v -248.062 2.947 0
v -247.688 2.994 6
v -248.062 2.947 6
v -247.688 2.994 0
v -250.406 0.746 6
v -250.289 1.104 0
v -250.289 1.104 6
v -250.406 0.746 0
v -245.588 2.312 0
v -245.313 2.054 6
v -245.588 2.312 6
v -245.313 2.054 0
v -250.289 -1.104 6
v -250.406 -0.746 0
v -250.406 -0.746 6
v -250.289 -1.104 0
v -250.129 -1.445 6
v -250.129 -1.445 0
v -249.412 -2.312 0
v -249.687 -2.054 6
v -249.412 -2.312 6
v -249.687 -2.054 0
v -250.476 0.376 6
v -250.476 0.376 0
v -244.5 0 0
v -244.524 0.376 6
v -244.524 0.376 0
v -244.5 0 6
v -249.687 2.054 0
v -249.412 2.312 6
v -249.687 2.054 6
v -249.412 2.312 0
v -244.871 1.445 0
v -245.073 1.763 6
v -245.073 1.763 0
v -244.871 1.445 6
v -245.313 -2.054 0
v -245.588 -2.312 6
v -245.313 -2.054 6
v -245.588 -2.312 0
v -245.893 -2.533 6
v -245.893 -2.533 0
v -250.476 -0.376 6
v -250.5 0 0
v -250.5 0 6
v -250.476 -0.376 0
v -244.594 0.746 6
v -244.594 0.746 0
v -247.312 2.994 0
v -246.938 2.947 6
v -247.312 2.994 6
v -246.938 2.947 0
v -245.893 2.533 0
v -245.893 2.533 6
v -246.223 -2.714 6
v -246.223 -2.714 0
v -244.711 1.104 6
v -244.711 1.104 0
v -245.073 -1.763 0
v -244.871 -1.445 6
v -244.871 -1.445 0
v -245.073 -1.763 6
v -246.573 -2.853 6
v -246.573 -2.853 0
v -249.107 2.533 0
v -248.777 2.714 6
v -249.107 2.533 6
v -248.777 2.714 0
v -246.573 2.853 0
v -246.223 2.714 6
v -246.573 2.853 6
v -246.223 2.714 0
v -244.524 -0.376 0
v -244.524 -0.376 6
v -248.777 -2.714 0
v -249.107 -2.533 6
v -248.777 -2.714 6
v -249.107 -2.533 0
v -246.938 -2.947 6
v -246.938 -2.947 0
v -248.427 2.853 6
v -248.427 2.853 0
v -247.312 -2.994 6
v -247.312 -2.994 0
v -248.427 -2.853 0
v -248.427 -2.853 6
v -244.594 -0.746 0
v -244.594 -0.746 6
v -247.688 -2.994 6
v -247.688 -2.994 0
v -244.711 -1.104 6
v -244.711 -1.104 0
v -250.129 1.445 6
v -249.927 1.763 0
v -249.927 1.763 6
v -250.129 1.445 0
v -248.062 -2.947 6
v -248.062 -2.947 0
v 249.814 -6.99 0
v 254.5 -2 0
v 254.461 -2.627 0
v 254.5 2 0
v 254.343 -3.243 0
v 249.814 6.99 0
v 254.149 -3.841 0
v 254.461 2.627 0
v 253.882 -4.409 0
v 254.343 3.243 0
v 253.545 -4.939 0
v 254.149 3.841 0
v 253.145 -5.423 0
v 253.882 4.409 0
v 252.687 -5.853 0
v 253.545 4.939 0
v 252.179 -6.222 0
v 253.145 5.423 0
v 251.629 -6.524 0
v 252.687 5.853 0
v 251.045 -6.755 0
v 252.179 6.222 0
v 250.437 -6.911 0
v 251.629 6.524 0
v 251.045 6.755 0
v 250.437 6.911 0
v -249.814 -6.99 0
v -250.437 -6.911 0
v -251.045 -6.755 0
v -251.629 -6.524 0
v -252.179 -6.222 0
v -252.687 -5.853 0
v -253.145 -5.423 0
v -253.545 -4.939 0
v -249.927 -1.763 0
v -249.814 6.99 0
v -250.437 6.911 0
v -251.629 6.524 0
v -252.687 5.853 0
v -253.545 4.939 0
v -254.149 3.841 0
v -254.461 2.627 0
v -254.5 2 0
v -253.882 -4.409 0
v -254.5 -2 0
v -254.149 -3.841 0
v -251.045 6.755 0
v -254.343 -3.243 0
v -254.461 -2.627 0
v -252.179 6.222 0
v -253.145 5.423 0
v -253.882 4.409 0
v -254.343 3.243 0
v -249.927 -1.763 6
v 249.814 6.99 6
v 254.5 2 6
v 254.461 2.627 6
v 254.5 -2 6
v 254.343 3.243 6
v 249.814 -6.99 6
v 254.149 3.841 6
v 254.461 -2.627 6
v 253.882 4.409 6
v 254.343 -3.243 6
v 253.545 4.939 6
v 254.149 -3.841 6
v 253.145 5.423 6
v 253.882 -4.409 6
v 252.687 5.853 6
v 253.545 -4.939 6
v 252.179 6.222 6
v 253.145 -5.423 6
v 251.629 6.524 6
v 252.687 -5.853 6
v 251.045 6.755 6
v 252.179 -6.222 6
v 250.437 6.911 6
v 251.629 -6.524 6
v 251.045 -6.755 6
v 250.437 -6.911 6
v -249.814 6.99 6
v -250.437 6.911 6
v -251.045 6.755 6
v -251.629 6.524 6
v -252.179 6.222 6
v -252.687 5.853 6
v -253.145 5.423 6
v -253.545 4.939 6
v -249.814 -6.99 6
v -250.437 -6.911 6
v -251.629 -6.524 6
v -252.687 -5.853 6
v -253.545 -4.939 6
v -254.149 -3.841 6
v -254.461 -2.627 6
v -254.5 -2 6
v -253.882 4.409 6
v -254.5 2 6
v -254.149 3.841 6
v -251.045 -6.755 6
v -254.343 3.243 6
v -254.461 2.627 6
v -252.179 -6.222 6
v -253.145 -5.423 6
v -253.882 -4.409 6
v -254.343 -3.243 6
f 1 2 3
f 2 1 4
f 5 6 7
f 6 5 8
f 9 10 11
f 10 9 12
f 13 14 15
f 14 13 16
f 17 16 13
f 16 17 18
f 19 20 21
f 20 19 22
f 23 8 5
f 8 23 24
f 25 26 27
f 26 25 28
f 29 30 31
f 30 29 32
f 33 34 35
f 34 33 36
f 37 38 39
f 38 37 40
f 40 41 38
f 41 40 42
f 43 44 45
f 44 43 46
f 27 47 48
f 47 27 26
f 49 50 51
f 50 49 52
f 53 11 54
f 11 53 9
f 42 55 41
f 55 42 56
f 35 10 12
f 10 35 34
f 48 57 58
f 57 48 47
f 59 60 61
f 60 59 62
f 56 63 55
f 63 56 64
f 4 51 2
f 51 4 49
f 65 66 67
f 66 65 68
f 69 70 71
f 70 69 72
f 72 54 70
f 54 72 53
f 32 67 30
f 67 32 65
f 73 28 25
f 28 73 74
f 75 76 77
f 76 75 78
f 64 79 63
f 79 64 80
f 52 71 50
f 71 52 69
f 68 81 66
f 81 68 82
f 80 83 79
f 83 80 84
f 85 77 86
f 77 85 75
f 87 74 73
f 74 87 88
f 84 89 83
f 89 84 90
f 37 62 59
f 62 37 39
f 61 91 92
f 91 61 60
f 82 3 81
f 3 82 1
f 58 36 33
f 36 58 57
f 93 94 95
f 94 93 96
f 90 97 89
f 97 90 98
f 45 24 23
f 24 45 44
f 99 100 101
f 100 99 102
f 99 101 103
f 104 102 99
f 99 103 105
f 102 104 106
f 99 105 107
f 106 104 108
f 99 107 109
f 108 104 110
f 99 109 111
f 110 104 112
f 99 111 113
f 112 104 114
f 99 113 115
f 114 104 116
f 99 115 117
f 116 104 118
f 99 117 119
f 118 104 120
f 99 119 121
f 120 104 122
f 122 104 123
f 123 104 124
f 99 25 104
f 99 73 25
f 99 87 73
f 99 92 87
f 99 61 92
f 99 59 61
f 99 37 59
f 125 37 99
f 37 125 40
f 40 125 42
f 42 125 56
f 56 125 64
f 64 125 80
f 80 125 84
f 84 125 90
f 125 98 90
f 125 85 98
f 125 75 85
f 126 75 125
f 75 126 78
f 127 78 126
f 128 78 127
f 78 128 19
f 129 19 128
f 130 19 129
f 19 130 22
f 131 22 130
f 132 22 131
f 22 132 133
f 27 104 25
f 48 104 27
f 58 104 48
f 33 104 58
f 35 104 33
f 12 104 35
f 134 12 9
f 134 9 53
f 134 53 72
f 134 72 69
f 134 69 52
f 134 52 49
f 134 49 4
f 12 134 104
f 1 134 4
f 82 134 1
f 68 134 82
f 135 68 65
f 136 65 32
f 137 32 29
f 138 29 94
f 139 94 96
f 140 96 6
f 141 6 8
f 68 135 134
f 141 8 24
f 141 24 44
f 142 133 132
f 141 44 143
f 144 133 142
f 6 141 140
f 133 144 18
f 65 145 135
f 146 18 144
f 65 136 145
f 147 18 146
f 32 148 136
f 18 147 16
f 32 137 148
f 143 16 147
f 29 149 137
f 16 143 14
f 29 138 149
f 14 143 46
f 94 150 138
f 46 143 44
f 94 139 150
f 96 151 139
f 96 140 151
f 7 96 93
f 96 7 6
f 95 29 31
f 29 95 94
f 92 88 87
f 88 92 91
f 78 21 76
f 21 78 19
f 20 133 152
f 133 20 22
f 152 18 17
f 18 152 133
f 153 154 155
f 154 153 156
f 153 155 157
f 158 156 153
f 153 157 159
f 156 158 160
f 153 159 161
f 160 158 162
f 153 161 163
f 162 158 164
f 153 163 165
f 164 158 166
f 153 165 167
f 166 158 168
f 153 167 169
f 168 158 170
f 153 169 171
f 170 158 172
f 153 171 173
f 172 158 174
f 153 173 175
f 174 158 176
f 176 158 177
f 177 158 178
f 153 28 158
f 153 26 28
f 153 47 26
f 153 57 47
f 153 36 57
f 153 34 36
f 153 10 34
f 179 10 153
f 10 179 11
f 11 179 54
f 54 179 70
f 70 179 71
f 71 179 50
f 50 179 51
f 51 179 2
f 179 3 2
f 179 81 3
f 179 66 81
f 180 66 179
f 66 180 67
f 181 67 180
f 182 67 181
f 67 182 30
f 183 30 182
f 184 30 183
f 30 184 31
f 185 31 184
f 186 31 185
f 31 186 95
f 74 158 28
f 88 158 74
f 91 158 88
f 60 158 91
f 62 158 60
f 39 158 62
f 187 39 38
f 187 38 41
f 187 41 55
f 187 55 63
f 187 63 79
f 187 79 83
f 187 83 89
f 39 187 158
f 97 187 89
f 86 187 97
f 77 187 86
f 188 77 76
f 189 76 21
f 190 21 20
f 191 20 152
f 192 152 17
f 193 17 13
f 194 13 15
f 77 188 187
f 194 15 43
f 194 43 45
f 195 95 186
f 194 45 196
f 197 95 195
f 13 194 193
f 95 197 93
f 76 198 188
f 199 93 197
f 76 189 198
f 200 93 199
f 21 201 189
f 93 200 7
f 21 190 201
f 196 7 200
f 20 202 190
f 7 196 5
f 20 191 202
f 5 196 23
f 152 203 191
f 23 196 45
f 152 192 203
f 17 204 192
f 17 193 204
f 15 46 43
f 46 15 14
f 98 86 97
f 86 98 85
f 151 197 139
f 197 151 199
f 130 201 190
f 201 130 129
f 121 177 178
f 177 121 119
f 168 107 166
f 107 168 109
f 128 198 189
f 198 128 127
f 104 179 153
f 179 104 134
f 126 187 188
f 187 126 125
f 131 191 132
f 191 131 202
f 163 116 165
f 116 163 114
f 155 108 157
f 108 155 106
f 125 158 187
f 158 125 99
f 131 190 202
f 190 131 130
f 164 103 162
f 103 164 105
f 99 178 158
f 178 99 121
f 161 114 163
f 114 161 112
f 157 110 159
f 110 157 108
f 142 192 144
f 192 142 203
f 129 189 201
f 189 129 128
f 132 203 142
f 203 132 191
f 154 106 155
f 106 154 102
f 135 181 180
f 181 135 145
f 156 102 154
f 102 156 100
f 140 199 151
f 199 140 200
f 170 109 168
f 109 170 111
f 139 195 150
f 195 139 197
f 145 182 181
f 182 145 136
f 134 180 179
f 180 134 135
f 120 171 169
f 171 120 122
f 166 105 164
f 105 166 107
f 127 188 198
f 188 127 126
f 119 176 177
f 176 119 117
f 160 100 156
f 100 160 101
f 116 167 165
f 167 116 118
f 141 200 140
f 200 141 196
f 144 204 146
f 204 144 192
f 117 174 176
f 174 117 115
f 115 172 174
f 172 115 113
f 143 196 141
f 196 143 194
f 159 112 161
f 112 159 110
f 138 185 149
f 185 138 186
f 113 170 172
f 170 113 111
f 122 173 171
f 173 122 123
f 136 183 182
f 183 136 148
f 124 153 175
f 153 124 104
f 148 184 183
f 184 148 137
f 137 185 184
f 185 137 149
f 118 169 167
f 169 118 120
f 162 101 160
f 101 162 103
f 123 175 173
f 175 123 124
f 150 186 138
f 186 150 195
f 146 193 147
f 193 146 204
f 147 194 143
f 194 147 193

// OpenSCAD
$fn = 50;


difference() {
	union() {
		hull() {
			translate(v = [-249.5000000000, 2.0000000000, 0]) {
				cylinder(h = 6, r = 5);
			}
			translate(v = [249.5000000000, 2.0000000000, 0]) {
				cylinder(h = 6, r = 5);
			}
			translate(v = [-249.5000000000, -2.0000000000, 0]) {
				cylinder(h = 6, r = 5);
			}
			translate(v = [249.5000000000, -2.0000000000, 0]) {
				cylinder(h = 6, r = 5);
			}
		}
	}
	union() {
		translate(v = [-247.5000000000, 0.0000000000, 0]) {
			cylinder(h = 6, r = 3.0000000000);
		}
		translate(v = [-247.5000000000, 0.0000000000, 0]) {
			cylinder(h = 6, r = 1.5000000000);
		}
		translate(v = [-247.5000000000, 0.0000000000, 0]) {
			cylinder(h = 6, r = 1.5000000000);
		}
		translate(v = [-247.5000000000, 0.0000000000, 0]) {
			cylinder(h = 6, r = 1.5000000000);
		}
	}
}
